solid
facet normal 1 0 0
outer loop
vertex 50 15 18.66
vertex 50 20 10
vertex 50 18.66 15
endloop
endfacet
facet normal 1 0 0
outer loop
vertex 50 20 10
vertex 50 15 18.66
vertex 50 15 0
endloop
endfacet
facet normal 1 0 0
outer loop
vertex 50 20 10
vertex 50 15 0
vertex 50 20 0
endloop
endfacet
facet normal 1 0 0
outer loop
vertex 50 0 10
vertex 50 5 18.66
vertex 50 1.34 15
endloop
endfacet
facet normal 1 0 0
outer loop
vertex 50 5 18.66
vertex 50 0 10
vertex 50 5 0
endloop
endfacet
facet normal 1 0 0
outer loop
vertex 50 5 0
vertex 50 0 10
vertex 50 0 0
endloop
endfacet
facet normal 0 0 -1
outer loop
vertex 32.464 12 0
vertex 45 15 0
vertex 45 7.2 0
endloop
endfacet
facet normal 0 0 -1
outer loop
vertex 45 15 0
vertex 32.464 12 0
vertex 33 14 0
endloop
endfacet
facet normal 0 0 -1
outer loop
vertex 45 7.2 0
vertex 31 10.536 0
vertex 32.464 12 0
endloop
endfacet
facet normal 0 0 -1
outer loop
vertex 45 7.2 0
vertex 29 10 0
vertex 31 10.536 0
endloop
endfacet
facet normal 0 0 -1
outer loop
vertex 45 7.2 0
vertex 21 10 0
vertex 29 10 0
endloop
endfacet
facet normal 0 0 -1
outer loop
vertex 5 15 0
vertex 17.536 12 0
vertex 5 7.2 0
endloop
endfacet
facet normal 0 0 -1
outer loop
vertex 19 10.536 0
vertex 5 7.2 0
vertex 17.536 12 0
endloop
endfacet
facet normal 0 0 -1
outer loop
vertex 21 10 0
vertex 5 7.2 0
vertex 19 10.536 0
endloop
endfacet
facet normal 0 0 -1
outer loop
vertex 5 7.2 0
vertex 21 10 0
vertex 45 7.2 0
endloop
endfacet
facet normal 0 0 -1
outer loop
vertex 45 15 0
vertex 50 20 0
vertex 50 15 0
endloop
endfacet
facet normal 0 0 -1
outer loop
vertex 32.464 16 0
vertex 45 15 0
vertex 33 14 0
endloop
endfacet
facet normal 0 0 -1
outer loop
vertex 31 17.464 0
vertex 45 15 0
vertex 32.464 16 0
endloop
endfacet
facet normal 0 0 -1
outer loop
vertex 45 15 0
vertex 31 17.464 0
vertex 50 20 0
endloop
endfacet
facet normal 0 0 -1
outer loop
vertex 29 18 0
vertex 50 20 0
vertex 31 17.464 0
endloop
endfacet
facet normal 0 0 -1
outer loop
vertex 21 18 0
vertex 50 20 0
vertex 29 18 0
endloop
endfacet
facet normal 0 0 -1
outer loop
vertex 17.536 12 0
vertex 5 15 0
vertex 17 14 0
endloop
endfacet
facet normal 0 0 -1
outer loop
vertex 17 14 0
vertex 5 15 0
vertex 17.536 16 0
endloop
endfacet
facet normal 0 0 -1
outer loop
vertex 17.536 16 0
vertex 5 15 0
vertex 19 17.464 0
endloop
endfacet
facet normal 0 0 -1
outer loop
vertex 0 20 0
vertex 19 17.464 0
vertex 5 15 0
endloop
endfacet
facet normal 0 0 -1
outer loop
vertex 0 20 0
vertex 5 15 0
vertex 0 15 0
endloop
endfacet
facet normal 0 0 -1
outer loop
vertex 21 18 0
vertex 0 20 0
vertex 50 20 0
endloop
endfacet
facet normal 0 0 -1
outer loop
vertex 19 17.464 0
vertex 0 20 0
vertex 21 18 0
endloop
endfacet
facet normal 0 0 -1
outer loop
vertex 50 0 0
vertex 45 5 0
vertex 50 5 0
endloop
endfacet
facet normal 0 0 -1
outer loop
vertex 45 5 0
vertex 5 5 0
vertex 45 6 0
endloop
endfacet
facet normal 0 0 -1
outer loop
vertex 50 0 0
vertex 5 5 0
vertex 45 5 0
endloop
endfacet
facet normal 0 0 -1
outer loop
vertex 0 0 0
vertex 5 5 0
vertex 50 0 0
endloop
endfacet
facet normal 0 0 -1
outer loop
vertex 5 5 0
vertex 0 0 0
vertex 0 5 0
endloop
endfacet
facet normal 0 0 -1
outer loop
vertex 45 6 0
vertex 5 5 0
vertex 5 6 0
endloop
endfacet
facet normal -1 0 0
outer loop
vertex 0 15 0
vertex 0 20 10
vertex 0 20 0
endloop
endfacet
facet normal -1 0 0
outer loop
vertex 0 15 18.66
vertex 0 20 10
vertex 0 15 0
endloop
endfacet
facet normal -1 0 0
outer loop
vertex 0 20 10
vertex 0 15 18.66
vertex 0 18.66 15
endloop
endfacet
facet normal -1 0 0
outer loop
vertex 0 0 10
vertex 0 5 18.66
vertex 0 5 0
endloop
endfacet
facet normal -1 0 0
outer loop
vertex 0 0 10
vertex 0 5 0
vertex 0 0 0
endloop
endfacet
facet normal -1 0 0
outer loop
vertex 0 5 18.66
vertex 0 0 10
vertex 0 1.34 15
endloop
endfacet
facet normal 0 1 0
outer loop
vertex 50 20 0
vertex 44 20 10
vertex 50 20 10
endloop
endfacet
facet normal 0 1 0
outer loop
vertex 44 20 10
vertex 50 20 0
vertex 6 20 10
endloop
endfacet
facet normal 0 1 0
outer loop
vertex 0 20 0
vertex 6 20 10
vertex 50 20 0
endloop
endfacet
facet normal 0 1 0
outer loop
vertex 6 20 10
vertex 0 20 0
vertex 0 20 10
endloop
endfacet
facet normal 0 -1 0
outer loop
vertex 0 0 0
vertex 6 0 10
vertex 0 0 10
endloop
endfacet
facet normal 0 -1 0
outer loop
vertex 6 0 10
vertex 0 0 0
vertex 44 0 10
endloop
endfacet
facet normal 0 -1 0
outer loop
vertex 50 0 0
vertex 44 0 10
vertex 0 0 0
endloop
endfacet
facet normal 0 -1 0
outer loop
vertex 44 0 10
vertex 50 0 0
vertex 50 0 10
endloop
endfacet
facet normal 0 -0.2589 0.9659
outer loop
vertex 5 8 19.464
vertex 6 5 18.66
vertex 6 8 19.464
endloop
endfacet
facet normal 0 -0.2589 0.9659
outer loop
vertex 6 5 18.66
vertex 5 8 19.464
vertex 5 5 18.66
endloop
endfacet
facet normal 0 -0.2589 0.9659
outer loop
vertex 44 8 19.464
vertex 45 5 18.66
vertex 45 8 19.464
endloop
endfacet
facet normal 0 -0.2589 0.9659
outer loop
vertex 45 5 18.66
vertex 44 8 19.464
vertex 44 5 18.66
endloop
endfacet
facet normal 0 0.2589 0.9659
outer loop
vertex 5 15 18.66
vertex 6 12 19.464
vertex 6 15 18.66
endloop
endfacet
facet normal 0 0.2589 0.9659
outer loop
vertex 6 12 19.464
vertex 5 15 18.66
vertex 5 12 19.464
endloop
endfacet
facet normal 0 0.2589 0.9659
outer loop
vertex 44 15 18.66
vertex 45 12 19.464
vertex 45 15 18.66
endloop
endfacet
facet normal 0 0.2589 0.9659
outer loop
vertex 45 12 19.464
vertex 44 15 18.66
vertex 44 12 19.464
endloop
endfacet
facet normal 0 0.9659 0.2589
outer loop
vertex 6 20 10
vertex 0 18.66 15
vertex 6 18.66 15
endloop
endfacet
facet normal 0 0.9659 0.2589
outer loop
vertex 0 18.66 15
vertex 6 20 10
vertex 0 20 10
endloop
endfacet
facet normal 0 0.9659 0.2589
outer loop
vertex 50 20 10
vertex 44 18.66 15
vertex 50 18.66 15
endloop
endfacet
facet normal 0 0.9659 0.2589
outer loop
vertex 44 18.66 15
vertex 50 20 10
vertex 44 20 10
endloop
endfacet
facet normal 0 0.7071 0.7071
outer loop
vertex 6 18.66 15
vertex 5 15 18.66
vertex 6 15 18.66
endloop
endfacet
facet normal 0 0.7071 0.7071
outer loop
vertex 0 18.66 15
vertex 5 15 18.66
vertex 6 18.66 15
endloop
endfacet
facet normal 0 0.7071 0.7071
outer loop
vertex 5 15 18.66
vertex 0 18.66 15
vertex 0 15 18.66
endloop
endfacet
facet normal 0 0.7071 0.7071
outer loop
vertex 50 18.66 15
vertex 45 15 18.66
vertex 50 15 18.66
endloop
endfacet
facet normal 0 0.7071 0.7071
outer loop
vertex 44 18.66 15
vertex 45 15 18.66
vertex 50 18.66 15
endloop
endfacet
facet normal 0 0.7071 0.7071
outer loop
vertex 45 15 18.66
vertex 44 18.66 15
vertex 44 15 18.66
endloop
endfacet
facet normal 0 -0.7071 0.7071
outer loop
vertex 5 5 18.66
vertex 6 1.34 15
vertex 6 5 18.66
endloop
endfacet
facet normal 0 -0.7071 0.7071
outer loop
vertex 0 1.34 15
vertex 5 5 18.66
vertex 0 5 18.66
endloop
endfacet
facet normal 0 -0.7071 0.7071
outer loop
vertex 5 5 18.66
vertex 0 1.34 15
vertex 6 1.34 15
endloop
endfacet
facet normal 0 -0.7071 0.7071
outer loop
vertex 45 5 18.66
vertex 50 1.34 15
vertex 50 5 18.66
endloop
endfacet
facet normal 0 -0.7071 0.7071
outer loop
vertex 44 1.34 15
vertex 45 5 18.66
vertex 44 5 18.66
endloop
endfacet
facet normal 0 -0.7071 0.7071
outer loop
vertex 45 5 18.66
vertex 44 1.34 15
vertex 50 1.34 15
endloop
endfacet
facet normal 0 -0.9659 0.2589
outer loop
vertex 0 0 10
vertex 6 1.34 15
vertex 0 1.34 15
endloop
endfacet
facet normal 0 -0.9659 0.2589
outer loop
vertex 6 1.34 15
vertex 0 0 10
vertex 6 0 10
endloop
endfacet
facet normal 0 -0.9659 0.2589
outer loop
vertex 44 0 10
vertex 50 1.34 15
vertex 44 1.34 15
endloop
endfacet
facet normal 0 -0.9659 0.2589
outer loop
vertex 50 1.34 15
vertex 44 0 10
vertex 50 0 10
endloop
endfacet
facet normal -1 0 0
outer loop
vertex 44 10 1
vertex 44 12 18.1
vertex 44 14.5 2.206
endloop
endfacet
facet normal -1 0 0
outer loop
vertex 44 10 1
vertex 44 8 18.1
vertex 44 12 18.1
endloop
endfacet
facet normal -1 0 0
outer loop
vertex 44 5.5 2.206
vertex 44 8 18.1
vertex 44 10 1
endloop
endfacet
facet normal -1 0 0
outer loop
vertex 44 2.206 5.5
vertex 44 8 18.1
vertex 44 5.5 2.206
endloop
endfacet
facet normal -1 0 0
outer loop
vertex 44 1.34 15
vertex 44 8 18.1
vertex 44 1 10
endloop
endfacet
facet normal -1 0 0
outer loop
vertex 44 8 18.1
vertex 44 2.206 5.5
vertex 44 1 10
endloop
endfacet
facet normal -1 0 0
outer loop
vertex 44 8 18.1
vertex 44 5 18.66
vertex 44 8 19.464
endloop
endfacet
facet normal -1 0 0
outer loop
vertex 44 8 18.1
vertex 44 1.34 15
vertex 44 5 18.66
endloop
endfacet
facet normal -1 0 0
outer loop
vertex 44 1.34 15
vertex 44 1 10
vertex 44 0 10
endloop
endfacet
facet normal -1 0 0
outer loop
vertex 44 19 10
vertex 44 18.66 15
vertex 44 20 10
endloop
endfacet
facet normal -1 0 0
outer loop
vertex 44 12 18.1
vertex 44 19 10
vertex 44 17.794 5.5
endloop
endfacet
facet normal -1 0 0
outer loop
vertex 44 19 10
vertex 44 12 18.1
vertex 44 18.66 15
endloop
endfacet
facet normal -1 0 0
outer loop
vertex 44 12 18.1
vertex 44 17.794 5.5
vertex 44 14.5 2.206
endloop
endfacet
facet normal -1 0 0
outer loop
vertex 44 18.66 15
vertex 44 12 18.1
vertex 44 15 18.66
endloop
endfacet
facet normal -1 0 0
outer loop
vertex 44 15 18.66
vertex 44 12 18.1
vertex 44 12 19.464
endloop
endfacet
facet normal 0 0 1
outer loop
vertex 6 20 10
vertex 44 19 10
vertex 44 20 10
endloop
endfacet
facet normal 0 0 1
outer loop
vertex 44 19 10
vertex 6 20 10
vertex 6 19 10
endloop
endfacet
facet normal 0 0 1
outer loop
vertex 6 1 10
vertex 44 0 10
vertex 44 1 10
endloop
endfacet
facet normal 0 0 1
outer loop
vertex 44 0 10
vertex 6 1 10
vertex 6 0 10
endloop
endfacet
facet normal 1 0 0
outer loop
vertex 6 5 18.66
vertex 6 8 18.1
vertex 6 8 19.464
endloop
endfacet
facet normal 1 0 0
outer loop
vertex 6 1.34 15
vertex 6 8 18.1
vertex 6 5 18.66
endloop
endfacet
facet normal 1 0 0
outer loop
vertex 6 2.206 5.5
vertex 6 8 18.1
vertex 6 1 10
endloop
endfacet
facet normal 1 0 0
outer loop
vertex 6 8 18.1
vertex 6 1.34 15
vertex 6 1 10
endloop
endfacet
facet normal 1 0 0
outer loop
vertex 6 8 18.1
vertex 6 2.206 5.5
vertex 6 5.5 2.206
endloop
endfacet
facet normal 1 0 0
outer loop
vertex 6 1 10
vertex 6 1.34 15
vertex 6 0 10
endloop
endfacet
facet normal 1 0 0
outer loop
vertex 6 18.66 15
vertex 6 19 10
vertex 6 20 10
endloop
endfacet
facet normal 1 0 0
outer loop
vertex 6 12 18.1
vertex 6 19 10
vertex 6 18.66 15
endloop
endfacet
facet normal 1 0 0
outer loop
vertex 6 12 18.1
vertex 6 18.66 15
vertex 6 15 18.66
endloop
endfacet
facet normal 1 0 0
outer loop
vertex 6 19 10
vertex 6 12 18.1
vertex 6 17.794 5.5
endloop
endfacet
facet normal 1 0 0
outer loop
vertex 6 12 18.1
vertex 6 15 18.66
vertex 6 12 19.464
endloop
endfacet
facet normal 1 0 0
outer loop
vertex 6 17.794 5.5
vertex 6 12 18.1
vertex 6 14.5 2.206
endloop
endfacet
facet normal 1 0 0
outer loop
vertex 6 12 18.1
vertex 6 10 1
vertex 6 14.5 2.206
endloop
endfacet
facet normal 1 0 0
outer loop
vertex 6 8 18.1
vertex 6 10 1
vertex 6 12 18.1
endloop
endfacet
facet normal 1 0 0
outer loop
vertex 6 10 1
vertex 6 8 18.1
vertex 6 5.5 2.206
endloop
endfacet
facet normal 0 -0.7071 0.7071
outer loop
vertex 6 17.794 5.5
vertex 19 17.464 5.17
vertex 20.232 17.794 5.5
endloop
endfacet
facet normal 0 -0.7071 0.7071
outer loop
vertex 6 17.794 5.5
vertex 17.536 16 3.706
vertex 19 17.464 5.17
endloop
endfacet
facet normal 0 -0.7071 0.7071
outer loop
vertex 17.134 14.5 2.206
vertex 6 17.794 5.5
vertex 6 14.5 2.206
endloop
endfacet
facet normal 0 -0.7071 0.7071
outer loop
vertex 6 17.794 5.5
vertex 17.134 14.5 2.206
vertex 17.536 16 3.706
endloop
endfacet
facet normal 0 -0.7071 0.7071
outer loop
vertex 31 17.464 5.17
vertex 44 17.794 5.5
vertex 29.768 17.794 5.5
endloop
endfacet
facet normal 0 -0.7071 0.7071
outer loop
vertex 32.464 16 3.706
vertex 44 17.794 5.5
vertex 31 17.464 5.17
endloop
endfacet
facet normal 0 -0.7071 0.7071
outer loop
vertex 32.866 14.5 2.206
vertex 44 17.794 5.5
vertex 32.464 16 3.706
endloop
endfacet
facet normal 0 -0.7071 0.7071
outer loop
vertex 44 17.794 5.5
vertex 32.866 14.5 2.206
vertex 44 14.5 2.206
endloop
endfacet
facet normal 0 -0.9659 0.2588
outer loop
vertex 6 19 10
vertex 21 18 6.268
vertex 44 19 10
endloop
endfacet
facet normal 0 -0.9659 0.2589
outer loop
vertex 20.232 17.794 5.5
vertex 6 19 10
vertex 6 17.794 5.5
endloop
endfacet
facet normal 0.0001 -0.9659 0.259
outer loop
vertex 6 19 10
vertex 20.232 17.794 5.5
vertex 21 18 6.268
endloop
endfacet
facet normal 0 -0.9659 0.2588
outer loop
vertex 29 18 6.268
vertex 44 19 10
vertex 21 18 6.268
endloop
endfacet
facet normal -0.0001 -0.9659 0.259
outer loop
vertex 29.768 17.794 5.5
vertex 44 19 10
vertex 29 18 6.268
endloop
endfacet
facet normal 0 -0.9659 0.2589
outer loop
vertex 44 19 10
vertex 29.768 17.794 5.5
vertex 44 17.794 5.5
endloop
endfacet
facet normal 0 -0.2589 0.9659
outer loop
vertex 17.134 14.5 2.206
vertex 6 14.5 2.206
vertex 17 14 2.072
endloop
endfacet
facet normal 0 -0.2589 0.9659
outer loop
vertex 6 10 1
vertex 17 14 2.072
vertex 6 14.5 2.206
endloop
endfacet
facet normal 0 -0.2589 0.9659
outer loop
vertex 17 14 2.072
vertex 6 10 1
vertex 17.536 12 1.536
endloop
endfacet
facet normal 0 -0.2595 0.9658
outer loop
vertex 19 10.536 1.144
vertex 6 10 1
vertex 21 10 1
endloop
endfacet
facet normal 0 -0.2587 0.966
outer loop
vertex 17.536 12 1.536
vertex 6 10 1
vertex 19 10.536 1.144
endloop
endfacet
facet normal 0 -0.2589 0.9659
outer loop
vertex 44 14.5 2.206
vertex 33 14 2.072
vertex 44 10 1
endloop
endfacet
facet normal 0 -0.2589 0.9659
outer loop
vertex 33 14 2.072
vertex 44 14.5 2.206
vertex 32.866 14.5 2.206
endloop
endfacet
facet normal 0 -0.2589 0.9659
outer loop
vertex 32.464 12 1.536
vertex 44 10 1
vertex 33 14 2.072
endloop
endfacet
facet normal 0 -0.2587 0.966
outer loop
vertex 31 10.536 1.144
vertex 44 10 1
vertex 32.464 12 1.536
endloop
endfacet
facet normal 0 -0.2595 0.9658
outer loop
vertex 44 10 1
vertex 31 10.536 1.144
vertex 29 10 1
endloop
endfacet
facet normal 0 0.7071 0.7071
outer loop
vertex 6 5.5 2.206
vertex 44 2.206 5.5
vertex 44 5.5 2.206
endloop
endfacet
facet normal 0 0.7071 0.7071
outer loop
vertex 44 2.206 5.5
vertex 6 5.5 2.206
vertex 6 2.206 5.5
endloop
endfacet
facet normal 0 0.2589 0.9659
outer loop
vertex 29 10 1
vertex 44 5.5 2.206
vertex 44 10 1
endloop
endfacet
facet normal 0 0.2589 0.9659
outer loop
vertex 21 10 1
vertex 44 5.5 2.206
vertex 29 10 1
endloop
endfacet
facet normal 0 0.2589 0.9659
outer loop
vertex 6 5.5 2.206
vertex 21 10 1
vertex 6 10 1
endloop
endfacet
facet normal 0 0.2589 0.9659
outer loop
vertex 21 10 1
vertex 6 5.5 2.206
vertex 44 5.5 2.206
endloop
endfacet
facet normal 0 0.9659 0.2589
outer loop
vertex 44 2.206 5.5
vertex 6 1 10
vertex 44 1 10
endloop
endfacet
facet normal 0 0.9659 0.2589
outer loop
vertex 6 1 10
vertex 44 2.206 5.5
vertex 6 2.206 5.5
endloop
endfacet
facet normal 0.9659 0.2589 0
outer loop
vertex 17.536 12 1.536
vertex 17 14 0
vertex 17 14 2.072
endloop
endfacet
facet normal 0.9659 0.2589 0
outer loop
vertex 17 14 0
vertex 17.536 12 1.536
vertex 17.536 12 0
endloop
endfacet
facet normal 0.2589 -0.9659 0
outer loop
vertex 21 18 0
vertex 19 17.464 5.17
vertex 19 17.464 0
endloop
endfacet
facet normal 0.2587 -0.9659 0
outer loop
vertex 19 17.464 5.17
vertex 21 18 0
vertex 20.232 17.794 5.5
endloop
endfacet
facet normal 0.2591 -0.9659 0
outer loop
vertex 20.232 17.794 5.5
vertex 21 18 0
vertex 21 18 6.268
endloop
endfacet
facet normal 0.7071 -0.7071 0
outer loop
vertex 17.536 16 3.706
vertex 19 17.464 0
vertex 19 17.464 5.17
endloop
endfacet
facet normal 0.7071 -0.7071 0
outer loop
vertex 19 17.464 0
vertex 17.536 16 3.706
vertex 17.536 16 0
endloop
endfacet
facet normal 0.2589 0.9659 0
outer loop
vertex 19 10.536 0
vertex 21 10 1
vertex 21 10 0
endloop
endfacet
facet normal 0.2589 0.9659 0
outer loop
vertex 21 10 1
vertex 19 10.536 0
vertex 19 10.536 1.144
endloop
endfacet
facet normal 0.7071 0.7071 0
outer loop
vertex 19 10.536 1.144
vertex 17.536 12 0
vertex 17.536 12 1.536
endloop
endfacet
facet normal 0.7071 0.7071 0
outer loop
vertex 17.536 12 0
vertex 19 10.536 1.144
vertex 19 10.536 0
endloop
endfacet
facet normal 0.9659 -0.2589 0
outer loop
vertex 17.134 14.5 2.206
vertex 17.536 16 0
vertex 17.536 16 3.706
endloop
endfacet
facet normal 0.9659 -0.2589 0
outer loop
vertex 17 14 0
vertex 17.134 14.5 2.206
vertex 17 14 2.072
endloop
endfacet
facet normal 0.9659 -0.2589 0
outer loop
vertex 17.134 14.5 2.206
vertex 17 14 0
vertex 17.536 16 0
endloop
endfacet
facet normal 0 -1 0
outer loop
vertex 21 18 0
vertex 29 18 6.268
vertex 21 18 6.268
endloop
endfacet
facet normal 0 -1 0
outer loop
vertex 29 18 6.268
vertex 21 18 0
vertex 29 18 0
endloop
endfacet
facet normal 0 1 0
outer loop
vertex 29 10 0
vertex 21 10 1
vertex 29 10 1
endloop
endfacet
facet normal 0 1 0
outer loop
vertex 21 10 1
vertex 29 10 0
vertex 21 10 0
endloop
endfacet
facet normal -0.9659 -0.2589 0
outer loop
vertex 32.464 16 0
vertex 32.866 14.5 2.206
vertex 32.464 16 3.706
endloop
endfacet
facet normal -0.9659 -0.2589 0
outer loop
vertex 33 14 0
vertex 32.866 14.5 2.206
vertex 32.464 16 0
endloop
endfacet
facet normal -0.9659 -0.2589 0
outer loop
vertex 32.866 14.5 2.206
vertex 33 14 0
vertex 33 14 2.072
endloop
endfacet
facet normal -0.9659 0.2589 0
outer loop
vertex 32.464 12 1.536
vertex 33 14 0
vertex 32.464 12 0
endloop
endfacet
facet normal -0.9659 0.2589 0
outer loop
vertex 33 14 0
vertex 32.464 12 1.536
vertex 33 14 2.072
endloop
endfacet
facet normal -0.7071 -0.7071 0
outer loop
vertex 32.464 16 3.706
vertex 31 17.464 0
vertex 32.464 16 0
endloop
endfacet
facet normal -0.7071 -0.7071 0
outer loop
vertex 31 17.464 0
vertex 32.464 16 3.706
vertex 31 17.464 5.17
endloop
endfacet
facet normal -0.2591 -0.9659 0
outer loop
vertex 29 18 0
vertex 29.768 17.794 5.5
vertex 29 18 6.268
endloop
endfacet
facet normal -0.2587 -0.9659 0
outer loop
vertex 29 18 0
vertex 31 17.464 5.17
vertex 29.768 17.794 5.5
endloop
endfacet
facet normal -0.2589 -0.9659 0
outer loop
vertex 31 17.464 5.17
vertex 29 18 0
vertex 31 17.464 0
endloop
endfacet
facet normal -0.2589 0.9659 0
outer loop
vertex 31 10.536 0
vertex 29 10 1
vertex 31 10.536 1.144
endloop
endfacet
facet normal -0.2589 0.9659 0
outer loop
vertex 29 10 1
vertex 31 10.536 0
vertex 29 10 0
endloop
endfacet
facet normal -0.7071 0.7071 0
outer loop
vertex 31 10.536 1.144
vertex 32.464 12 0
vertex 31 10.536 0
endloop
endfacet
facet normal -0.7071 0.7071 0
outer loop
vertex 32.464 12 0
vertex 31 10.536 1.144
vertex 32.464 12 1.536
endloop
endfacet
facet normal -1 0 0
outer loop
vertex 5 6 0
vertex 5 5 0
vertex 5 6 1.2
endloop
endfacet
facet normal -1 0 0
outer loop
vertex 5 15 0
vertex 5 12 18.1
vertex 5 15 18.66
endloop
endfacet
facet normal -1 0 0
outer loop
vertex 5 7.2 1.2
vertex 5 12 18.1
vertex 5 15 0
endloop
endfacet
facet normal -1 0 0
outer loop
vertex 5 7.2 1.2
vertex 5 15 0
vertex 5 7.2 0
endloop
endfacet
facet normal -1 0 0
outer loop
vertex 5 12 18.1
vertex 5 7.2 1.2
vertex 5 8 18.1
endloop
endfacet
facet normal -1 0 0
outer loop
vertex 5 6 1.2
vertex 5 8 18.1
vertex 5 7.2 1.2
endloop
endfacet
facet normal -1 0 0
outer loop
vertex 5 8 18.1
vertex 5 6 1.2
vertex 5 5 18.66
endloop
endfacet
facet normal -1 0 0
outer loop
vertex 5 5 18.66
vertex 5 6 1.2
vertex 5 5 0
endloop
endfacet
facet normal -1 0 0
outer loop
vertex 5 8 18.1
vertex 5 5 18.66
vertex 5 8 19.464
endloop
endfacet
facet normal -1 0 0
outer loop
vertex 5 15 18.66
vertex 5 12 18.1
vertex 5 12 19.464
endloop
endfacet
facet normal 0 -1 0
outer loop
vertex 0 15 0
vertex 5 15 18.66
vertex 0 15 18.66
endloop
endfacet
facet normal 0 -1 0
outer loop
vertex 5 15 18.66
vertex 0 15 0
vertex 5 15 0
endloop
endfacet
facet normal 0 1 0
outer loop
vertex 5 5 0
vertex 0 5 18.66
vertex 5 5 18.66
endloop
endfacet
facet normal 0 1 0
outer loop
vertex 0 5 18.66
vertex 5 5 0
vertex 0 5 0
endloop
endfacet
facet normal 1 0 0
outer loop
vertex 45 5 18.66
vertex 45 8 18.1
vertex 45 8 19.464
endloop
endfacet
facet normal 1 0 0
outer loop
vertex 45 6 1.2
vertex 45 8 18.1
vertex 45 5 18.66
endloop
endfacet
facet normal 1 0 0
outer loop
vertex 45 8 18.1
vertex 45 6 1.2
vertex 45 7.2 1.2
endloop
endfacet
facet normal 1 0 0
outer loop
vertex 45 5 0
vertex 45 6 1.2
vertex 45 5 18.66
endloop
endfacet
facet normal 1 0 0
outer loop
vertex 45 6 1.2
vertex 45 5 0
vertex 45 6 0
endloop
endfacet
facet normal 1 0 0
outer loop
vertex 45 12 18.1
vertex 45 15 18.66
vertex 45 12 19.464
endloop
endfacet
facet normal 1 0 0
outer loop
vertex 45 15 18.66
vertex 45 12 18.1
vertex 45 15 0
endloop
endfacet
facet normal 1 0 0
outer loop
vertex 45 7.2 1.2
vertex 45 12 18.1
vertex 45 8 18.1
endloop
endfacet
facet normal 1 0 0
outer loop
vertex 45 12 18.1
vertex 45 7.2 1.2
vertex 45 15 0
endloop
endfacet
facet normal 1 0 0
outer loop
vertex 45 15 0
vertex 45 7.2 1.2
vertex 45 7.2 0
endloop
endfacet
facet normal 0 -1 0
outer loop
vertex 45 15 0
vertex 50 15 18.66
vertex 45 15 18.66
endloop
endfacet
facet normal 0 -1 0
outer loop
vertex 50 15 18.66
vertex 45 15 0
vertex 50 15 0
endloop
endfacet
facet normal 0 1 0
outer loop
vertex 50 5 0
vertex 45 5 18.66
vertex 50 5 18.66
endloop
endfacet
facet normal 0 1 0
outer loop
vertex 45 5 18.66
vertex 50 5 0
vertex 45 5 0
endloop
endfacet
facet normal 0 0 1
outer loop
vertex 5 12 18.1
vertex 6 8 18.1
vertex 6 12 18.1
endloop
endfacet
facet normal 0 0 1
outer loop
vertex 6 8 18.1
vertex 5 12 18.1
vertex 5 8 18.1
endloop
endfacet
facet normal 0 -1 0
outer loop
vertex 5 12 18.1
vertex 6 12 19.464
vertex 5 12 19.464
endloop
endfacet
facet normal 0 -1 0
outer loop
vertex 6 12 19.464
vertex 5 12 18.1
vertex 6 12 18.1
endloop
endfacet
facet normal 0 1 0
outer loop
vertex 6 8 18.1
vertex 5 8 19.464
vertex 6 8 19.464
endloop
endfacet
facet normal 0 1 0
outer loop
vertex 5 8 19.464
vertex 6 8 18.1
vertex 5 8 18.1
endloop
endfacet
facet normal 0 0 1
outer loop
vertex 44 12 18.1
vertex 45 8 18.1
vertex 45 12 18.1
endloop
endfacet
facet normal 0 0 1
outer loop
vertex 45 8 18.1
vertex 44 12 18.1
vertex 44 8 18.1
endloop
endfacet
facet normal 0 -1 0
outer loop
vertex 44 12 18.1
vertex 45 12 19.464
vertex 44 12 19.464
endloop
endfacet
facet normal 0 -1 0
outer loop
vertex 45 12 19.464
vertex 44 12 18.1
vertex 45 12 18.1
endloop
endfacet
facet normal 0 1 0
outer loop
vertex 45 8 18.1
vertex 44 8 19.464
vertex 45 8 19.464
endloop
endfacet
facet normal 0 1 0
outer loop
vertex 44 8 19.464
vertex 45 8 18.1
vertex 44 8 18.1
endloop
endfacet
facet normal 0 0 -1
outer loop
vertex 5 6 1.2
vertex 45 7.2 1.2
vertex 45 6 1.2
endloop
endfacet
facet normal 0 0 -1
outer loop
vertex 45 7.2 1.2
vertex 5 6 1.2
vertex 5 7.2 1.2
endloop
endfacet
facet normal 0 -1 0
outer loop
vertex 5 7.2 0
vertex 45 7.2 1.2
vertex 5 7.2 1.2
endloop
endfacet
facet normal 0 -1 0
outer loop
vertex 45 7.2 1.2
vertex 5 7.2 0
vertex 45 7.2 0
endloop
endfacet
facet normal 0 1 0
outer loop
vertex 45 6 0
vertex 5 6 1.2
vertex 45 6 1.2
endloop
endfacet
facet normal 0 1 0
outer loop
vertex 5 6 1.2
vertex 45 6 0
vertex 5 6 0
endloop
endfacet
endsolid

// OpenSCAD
// INPUTS #############################

$fn = 12;

// MODULES ############################
// HELPERS ############################
// GLOBAL PARAMETERS ##################

function d_ext() = 20;
function d_batterie() = 18; // 15~17mm
function h_batterie() = 38; // ~35mm
function h_espacement() = 1;
function h_bord() = 5; // pour les bords
function h_creux() = 10; // creux dans les bords
function h_plaque() = 2;
function l_plaque() = 4;
function h_passage() = 1.2;
function h_ecart_passage() = 4;
function d_ouverture() = 8;
function h_ouverture() = 8;

function h_socle() = h_batterie()+(h_bord()+h_espacement())*2;

// BASE ###############################

difference() {
    union() { // base du support
        cube([h_socle(),d_ext(),d_ext()/2]);
        translate([0,d_ext()/2,d_ext()/2])
        rotate([0,90,0])
        cylinder(d=d_ext(),h=h_socle());
    }
    translate([h_espacement()+h_bord(),0,d_ext()/2]) {
        translate([0,-0.1,0])
        cube([h_batterie(),d_ext()+0.2,d_ext()/2+0.1]); // emplacement de la batterie
        translate([0,d_ext()/2,0])
        rotate([0,90,0])
        cylinder(d=d_batterie(),h=h_batterie()); // ouverture de la batterie
    }
    translate([-0.1,(d_ext()-h_creux())/2,-0.1])
    cube([h_bord()+0.1,h_creux(),d_ext()+0.2]); // creux dans le premier bord
    translate([h_socle()-h_bord(),(d_ext()-h_creux())/2,-0.1])
    cube([h_bord()+0.1,h_creux(),d_ext()+0.2]); // creux dans le deuxième bord
    translate([h_bord()-0.1,(d_ext()-l_plaque())/2,d_ext()-h_plaque()+0.1])
    cube([h_espacement()+0.2,l_plaque(),h_plaque()+0.1]); // passage plaque du premier bord
    translate(
        [h_bord()+h_espacement()+h_batterie()-0.1
        ,(d_ext()-l_plaque())/2
        ,d_ext()-h_plaque()+0.1]
    )
    cube([h_espacement()+0.2,l_plaque(),h_plaque()+0.1]); // passage plaque du deuxième bord
    translate([h_bord()-0.1,d_ext()/2-h_ecart_passage(),-0.1])
    #cube([h_batterie()+h_espacement()*2+0.2,h_passage(),h_passage()+0.1]); // passage du cable
    translate([h_socle()/2,(d_ext()+d_ouverture())/2,-0.1]) { // ouverture pour pousser la batterie
        translate([h_ouverture()/-2,0,0])
        cylinder(d=d_ouverture(),h=d_ext()/2);
        translate([h_ouverture()/-2,d_ouverture()/-2,0])
        cube([h_ouverture(),d_ouverture(),d_ext()/2]);
        translate([h_ouverture()/2,0,0])
        cylinder(d=d_ouverture(),h=d_ext()/2);
    }
}
